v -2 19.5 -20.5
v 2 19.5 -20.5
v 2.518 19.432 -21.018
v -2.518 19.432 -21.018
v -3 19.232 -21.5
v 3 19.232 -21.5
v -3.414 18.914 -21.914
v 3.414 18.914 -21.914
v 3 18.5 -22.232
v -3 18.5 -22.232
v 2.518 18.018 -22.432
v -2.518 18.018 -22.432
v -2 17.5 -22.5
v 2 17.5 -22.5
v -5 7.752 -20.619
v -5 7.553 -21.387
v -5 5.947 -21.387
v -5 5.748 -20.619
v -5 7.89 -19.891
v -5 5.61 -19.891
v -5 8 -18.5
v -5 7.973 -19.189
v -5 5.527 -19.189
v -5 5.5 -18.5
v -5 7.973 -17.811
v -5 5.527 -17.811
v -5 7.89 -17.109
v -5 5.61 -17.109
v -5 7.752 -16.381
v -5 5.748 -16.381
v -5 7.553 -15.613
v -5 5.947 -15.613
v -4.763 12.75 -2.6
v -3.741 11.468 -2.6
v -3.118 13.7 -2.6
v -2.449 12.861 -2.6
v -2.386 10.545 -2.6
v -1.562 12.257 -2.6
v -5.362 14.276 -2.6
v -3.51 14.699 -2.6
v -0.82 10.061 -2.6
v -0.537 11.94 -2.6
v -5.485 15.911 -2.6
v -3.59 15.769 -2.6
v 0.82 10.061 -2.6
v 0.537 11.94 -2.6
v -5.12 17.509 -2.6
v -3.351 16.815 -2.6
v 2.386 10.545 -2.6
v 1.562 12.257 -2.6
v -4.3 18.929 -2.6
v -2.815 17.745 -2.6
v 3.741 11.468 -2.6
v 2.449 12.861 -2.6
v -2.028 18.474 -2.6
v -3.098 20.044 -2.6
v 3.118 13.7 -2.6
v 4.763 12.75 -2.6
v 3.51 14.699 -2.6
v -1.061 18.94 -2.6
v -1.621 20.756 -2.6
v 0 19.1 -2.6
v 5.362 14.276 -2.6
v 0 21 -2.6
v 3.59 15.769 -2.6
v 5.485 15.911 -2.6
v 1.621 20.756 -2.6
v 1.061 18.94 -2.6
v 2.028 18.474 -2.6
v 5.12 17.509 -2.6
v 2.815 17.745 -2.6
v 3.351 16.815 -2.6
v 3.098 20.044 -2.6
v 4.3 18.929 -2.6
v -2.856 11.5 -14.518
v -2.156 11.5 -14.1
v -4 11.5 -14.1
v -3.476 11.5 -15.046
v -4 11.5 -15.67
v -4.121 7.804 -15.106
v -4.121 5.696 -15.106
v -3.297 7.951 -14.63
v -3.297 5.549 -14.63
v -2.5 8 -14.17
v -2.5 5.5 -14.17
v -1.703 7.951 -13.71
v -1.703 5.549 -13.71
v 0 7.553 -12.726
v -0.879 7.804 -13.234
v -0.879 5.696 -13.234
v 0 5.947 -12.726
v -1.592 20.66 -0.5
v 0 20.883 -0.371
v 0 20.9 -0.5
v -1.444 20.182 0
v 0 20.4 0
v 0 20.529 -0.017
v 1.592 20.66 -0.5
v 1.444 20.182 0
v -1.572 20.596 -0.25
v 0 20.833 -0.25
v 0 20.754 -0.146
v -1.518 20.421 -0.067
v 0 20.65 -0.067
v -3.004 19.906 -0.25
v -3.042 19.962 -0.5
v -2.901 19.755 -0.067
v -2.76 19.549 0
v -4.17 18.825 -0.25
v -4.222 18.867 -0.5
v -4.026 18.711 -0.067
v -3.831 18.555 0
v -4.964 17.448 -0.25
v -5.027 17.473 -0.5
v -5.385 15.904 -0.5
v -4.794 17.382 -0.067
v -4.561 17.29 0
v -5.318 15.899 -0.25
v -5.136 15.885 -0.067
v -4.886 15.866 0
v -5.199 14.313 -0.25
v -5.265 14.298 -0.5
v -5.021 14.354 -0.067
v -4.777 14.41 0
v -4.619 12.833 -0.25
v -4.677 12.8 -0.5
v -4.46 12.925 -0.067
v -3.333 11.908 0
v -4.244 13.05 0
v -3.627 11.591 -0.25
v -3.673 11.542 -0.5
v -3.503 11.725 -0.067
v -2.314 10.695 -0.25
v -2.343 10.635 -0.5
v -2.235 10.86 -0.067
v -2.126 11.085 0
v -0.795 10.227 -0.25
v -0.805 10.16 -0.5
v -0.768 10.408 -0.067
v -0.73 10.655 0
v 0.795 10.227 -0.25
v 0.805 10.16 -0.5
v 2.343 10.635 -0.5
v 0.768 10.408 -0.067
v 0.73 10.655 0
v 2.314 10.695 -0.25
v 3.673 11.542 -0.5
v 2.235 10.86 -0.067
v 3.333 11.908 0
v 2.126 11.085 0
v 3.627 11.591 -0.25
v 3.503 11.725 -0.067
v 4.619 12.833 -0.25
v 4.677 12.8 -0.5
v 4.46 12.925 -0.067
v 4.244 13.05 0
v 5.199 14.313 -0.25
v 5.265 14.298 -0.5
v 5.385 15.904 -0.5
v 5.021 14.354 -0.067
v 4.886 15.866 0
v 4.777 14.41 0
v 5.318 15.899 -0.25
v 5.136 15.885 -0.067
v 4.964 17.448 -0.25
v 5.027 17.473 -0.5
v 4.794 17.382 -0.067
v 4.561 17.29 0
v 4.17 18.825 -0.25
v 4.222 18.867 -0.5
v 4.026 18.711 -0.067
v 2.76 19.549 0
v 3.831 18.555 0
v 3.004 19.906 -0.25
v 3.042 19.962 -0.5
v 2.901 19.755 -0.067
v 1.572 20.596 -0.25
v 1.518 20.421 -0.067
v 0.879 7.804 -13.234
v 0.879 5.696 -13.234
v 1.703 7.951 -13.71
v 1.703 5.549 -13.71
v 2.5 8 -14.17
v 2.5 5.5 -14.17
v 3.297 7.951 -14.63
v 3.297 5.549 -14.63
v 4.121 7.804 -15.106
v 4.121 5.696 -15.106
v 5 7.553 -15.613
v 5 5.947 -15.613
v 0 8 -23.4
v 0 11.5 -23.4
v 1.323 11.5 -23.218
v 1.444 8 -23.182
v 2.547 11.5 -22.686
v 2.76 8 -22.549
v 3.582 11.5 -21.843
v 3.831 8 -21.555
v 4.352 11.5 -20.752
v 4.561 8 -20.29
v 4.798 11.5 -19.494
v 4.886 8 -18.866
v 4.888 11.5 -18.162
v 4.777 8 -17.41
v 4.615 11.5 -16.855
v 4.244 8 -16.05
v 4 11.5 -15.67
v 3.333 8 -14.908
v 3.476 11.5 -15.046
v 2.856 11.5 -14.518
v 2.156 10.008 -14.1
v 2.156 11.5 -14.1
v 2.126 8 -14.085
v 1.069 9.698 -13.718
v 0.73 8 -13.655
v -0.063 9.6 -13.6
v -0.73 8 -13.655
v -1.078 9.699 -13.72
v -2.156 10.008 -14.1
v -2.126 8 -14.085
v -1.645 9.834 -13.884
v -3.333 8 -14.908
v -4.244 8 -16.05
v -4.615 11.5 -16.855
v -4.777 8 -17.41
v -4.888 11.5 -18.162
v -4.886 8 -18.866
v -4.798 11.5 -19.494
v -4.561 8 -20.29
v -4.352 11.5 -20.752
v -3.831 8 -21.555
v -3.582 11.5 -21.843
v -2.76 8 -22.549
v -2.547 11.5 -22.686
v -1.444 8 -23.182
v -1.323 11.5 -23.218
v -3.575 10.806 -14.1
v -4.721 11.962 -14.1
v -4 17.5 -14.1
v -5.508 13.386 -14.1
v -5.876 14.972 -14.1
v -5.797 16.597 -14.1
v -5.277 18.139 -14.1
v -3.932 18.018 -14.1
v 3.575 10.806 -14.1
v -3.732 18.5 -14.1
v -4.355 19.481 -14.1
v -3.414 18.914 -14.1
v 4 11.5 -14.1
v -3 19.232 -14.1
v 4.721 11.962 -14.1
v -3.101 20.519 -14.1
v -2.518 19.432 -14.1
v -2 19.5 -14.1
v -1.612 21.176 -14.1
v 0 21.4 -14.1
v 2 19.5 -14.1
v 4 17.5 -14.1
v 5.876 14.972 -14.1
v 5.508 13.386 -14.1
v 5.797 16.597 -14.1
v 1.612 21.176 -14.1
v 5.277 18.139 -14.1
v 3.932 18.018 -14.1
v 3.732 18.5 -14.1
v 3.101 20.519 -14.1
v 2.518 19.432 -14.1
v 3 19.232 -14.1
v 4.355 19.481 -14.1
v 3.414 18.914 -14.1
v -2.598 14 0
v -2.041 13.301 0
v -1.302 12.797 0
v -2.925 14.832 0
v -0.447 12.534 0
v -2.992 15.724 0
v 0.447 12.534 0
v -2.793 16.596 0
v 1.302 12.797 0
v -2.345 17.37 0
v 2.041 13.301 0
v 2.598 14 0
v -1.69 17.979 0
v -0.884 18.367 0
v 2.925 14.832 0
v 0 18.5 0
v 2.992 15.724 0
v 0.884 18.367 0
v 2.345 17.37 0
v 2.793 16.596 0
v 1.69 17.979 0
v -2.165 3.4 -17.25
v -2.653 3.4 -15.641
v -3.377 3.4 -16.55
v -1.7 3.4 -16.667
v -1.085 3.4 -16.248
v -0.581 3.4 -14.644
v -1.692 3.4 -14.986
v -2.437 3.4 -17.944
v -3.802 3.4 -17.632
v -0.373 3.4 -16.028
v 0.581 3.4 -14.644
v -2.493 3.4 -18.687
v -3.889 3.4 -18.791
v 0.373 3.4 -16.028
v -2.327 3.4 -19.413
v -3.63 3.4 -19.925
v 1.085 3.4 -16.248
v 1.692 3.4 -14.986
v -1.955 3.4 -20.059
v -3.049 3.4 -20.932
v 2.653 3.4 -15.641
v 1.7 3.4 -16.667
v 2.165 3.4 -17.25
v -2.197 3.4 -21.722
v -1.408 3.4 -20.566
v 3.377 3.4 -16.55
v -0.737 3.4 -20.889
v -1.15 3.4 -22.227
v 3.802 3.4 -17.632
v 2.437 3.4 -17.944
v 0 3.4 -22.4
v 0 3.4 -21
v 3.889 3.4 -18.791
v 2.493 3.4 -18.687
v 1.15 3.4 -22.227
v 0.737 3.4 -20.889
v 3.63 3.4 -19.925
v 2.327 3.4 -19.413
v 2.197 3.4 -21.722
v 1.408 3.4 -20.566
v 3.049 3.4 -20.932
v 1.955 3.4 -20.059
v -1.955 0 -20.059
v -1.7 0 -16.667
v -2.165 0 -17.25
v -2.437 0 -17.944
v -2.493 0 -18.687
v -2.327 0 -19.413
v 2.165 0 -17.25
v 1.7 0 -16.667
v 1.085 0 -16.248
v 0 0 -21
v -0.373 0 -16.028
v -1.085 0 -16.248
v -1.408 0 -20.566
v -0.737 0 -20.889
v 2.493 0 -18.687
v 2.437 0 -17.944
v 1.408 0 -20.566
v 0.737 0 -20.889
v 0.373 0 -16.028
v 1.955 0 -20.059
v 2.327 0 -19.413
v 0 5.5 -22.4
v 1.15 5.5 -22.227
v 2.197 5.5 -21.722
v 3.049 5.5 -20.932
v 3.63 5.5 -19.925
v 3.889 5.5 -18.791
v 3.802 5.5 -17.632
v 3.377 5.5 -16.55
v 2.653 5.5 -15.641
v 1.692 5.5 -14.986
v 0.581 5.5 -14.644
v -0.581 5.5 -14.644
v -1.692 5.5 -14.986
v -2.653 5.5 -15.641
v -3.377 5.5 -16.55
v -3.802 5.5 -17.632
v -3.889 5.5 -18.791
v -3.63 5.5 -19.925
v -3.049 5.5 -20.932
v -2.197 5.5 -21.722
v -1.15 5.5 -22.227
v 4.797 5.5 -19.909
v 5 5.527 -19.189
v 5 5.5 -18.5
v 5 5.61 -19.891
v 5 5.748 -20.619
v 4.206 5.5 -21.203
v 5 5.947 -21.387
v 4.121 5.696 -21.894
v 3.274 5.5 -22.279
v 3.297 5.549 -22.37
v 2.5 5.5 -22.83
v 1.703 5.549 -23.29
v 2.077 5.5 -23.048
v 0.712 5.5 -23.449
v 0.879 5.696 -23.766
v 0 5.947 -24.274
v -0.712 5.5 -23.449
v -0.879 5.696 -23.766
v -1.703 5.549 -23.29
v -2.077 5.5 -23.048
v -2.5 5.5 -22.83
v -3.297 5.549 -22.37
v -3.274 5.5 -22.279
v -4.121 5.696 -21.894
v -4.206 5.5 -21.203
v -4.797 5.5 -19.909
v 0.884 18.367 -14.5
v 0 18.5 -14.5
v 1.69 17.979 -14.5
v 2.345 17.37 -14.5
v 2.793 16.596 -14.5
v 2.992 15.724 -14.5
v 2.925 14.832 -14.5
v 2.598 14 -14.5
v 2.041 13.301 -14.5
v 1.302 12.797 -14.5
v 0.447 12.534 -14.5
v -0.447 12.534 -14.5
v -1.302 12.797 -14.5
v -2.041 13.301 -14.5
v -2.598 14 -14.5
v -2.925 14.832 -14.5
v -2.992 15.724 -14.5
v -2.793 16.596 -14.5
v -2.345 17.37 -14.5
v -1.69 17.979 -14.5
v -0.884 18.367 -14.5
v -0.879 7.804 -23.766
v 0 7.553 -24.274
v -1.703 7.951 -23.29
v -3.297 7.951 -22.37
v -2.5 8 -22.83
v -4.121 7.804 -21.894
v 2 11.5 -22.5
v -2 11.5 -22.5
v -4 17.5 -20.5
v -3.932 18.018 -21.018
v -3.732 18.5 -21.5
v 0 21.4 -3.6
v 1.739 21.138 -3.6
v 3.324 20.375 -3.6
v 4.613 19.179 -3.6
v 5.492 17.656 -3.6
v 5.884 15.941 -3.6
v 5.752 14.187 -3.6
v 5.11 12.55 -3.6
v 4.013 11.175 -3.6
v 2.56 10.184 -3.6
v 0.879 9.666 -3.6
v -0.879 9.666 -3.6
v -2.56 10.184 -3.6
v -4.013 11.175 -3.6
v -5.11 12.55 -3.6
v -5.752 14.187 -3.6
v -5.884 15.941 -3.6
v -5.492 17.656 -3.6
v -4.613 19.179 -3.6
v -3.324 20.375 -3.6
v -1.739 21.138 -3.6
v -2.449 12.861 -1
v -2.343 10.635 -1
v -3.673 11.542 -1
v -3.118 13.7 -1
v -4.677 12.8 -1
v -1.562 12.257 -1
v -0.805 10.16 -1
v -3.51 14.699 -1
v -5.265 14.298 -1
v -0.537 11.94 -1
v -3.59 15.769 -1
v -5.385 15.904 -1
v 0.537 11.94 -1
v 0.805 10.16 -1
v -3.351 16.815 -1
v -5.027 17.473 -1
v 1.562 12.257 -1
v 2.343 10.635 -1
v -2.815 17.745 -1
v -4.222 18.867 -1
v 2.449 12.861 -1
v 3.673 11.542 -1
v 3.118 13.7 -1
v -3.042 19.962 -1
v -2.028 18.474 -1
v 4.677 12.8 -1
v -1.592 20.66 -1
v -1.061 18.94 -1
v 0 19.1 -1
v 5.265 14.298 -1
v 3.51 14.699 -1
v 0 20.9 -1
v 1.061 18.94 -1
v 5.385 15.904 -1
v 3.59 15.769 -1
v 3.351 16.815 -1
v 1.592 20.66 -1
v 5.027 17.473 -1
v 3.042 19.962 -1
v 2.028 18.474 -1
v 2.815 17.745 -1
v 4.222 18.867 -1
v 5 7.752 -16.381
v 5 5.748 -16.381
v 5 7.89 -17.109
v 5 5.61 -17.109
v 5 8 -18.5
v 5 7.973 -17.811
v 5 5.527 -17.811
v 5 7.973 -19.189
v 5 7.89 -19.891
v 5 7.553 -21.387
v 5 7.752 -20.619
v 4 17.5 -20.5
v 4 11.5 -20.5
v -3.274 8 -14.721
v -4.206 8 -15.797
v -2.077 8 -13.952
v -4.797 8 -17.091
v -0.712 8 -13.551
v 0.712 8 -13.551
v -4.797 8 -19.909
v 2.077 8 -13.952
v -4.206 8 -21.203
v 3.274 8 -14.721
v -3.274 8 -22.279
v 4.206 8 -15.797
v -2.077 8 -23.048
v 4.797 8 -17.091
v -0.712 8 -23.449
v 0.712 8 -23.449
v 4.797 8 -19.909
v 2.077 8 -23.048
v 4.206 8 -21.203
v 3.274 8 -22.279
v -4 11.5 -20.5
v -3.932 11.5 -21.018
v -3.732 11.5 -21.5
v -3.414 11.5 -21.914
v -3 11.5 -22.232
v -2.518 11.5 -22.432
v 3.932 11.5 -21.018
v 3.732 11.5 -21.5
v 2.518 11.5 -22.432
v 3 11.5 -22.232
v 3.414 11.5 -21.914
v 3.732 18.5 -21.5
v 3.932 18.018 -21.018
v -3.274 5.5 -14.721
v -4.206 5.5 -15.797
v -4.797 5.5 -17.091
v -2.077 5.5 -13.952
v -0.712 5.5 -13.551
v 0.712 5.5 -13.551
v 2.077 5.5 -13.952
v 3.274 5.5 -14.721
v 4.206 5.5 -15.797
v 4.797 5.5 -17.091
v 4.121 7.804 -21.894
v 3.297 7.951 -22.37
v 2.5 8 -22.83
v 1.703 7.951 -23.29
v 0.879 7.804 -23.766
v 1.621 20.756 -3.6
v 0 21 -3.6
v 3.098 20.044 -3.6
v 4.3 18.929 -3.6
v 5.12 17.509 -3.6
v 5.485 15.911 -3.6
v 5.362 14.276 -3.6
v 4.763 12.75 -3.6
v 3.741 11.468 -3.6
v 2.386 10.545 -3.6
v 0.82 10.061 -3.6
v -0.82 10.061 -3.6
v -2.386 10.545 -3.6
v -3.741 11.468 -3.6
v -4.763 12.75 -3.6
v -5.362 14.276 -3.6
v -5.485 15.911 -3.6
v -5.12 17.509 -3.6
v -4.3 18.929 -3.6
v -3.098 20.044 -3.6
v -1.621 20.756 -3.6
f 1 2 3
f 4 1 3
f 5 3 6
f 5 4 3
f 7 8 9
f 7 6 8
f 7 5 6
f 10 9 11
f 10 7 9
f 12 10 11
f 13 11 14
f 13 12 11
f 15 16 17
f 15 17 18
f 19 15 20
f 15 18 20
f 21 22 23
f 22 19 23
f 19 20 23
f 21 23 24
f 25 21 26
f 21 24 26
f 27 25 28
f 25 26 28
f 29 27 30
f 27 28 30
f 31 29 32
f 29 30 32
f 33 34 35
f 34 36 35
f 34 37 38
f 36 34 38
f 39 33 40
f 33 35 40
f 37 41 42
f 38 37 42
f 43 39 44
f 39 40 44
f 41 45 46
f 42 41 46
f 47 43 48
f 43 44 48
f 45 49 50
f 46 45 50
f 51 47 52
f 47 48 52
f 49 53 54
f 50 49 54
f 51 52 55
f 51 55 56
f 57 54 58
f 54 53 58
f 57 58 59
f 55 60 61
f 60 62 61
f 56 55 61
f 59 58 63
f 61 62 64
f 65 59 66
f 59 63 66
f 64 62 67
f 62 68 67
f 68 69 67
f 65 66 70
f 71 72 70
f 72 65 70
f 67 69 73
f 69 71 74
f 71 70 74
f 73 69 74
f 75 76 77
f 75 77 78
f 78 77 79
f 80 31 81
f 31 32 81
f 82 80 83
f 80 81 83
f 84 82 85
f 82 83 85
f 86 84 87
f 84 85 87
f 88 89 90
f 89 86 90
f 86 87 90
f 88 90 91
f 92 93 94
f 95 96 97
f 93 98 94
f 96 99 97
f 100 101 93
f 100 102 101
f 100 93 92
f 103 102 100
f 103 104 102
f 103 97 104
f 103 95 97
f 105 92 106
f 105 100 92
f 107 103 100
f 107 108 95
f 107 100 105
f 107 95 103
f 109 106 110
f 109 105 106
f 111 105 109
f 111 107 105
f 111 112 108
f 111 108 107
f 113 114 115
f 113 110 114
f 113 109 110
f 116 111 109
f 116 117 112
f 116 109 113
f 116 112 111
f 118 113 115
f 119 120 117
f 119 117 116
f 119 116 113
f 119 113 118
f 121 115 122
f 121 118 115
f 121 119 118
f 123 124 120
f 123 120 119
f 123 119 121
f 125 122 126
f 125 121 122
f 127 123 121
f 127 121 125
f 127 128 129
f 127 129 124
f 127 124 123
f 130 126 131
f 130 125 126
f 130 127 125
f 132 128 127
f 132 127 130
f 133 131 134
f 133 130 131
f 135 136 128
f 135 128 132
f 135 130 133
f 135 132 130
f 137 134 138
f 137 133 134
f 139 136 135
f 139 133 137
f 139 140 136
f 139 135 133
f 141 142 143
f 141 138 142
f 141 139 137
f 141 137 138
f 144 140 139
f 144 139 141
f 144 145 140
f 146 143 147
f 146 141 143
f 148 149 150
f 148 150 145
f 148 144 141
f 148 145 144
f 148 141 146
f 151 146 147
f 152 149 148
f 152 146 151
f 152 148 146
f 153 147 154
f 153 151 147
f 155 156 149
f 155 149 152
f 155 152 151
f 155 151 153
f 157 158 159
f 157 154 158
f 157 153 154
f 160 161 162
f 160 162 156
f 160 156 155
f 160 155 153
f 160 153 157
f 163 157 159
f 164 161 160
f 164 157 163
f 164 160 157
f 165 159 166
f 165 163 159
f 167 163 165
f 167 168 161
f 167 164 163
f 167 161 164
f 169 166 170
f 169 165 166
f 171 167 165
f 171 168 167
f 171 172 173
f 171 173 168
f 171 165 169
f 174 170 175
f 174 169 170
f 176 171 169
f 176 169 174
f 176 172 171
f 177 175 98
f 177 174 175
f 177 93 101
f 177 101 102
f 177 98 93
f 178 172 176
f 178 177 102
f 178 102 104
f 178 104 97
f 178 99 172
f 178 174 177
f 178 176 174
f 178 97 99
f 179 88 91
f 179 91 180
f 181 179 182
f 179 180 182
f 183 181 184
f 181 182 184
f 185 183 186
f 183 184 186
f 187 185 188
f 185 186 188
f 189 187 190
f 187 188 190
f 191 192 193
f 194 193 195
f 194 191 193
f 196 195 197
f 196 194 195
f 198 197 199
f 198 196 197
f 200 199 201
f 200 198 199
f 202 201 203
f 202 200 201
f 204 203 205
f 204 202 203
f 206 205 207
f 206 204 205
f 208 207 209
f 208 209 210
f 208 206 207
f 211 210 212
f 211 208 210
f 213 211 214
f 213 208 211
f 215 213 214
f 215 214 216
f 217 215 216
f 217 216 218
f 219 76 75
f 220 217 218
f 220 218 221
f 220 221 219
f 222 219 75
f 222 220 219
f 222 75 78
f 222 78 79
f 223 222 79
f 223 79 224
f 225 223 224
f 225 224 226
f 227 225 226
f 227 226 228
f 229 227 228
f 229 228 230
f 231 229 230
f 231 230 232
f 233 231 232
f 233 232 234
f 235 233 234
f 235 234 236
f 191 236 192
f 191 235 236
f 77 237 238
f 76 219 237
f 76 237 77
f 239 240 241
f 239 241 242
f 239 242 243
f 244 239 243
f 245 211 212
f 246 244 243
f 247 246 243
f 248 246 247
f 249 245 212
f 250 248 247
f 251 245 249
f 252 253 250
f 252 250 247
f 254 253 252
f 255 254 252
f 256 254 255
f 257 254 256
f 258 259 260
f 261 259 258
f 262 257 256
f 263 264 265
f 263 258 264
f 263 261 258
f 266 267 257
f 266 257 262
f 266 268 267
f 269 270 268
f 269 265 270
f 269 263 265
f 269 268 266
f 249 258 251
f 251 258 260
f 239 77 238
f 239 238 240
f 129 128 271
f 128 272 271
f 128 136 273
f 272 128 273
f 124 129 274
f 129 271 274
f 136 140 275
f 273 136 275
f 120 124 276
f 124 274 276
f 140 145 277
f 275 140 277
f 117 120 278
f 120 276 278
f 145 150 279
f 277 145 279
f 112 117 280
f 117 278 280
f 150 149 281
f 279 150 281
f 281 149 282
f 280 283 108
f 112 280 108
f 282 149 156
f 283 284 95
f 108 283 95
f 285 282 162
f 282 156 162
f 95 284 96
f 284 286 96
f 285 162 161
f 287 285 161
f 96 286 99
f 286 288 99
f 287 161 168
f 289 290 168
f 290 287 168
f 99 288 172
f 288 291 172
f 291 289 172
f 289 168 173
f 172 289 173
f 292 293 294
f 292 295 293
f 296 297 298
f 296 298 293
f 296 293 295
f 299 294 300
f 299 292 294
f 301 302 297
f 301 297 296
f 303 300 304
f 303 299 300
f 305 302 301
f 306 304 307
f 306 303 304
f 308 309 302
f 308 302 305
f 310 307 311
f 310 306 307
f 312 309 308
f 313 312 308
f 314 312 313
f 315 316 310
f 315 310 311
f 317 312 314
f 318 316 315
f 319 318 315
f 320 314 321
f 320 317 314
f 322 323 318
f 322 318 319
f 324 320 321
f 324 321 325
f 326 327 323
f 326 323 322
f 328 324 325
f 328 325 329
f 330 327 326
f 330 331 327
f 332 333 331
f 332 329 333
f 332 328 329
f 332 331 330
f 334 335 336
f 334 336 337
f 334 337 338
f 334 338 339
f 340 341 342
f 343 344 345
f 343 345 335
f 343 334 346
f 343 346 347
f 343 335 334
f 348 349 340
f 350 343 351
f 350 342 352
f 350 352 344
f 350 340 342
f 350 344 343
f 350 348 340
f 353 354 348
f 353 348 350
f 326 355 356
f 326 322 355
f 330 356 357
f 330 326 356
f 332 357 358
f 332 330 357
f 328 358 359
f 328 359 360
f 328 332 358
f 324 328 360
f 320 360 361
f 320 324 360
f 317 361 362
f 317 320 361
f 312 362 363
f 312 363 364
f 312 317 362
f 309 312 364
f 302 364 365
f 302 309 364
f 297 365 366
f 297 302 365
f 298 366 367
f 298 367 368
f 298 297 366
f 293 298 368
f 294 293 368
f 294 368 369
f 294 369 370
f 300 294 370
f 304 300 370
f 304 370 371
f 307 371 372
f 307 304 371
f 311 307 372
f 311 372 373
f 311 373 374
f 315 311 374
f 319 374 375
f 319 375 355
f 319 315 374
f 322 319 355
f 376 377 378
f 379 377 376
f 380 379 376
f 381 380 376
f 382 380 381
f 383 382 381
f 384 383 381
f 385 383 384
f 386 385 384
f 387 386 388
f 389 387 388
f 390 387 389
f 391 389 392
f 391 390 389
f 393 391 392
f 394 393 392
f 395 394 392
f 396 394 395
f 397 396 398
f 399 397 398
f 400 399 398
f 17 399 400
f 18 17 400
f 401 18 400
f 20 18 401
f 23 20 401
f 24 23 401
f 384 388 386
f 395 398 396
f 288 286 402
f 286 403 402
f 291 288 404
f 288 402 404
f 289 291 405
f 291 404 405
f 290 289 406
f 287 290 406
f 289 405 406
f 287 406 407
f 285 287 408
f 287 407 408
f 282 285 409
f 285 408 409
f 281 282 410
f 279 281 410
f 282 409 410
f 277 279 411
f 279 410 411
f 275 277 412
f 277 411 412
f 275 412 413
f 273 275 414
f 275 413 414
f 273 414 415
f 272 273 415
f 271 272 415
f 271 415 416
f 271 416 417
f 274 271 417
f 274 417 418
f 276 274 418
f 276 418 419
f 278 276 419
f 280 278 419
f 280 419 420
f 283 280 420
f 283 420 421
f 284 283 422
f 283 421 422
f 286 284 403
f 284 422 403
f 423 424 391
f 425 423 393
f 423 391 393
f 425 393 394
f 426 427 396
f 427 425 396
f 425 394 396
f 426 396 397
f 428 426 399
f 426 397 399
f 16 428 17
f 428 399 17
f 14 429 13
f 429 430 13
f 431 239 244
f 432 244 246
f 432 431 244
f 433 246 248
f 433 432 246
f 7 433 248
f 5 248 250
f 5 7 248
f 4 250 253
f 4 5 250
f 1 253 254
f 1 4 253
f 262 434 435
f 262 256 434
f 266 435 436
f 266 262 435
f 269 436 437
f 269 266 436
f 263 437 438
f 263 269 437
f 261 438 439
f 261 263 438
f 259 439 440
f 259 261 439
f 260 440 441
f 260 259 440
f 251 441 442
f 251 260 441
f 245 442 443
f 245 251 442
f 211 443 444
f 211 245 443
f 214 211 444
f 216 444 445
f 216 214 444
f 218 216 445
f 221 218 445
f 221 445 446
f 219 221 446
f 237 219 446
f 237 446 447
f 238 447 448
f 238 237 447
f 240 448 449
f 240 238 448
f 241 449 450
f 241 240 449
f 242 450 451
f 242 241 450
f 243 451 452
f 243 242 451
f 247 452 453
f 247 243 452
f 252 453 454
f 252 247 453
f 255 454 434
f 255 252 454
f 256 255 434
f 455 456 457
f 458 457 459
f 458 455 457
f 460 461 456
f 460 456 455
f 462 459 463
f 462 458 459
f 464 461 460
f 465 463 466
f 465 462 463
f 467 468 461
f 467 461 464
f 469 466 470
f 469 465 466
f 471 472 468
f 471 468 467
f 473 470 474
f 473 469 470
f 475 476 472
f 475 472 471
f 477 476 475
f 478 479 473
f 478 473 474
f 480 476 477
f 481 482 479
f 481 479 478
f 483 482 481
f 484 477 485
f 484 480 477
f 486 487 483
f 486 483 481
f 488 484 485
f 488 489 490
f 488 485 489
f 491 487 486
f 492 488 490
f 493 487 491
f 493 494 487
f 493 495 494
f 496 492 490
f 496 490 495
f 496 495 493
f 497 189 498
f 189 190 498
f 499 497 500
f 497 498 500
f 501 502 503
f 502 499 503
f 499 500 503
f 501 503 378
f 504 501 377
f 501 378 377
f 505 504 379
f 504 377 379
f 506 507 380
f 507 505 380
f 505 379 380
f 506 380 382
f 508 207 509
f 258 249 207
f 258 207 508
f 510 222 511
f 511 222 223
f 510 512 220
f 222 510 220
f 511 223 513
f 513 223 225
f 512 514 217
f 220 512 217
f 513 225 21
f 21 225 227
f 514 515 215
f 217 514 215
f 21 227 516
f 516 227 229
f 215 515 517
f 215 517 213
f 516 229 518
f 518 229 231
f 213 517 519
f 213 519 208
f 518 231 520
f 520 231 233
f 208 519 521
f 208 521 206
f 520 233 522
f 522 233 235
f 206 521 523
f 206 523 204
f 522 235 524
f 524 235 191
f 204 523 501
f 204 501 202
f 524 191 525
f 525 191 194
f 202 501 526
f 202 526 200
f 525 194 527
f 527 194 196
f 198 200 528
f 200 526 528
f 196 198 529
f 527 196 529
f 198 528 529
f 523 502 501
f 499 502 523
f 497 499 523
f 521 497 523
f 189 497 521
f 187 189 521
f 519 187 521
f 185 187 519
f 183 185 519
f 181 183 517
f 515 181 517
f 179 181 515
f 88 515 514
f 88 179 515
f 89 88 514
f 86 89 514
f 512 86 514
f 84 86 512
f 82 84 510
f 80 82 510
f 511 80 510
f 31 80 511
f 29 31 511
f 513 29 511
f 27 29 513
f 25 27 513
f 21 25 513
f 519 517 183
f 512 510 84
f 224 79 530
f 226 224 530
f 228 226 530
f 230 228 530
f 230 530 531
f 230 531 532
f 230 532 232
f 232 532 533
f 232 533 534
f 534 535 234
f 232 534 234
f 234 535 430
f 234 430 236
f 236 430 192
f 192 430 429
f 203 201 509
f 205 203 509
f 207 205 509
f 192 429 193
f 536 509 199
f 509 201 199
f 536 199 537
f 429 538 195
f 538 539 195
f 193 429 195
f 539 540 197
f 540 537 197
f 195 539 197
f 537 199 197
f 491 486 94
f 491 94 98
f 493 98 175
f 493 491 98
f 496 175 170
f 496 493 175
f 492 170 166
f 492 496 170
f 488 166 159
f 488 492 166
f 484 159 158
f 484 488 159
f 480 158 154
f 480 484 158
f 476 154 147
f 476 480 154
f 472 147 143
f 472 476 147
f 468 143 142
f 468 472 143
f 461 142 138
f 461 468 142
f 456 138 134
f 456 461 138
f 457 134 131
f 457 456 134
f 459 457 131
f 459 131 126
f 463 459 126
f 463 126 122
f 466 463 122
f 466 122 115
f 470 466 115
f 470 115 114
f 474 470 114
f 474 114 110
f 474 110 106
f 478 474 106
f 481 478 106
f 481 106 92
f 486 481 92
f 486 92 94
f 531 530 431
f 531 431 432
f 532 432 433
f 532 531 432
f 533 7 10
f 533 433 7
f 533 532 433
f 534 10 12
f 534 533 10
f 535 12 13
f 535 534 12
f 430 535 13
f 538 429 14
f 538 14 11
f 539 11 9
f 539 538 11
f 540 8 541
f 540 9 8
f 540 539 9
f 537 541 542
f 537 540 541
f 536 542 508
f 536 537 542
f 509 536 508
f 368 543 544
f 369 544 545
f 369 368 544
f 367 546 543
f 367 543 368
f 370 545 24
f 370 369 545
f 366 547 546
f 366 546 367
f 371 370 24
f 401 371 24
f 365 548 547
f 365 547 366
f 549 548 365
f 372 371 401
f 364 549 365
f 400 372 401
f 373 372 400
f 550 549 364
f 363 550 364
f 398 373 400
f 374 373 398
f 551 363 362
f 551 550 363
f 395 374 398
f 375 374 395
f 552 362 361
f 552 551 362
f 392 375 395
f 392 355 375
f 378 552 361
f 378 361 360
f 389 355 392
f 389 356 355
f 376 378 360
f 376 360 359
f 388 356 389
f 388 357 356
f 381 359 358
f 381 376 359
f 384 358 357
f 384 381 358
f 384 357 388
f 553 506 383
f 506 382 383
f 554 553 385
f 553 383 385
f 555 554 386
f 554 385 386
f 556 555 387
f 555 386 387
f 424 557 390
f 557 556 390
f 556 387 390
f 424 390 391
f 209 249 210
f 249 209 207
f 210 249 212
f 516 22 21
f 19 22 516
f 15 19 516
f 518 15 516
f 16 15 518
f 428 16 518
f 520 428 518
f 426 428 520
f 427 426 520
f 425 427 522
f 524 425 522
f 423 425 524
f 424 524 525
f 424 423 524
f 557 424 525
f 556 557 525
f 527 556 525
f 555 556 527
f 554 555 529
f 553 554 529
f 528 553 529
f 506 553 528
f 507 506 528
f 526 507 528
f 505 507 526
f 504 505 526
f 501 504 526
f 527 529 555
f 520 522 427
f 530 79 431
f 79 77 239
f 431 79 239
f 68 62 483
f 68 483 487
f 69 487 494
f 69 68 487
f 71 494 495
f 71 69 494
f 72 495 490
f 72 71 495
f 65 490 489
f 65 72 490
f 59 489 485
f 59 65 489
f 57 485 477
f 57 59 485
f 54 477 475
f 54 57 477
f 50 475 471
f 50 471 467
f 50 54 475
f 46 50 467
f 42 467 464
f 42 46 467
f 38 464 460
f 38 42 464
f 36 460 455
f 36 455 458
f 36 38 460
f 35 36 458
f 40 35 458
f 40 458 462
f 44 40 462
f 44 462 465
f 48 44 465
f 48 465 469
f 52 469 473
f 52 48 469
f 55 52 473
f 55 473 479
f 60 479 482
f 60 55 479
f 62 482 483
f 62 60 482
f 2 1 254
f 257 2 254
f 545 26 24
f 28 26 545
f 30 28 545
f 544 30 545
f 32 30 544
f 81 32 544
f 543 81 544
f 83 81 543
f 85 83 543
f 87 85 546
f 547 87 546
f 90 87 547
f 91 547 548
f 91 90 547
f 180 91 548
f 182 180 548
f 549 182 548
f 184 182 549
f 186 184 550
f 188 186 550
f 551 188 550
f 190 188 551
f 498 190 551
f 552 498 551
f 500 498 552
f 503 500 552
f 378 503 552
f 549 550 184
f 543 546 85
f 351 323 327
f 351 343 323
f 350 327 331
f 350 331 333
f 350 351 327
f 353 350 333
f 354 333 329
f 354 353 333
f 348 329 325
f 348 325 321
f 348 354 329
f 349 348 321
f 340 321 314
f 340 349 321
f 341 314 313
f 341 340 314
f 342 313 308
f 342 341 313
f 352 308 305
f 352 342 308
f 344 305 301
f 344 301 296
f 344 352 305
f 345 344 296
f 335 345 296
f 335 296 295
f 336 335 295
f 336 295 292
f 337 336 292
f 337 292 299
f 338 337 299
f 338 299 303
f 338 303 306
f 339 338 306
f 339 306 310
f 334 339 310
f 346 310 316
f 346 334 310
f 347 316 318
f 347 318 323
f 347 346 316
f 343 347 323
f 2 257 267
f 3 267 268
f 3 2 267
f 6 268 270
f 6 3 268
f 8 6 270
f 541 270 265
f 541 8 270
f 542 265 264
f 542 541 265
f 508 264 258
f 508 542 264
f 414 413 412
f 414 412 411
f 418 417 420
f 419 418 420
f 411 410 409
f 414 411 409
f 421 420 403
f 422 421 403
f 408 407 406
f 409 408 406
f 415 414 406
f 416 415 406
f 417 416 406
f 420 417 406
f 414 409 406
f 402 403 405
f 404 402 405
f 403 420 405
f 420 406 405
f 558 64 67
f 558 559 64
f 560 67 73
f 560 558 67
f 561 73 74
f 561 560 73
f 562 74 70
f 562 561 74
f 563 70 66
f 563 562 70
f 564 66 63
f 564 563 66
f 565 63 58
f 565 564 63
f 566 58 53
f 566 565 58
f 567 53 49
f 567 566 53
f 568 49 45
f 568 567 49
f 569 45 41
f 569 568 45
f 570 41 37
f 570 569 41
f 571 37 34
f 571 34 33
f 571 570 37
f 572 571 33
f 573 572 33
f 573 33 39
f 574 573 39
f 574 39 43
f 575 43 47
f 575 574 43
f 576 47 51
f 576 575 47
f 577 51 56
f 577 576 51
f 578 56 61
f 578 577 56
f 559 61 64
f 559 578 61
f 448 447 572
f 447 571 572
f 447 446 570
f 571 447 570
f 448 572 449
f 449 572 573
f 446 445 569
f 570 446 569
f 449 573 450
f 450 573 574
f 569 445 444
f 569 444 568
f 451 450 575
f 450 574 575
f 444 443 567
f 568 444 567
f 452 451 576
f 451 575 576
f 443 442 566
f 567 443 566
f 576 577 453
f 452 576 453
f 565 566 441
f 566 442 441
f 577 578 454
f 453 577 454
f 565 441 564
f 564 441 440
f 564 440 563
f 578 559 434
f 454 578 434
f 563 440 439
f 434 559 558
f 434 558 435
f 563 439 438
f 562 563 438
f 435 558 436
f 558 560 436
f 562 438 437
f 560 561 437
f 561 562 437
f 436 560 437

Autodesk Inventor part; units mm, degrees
ref_plane "YZ Plane" through (0, 0, 0) normal (1, 0, 0) x (0, 1, 0)
ref_plane "XZ Plane" through (0, 0, 0) normal (0, 1, 0) x (-1, 0, 0)
ref_plane "XY Plane" through (0, 0, 0) normal (0, 0, 1) x (1, 0, 0)
sketch "Sketch_20" plane through (0, 0, 0) normal (1, 0, 0) x (0, 1, 0)
  line L0 (19.5, -14.1) -> (11.5, -14.1)
  line L1 (11.5, -14.1) -> (11.5, -22.5)
  line L2 (11.5, -22.5) -> (17.5, -22.5)
  arc A0 (17.5, -22.5) -> (19.5, -20.5) centre (17.5, -20.5) ccw
  line L3 (19.5, -20.5) -> (19.5, -14.1)
extrude "Extrusion1" add sketch "Sketch_20" along normal mid plane 8
sketch "Sketch_2" plane through (0, 0, 0) normal (0, 0, 1) x (1, 0, 0)
  line L0 (-10, 5) -> (10, 5)
  line L1 (10, 5) -> (10, 25)
  line L2 (10, 25) -> (-10, 25)
  line L3 (-10, 25) -> (-10, 5)
  line L4 (-4, 11.5) -> (4, 11.5)
  line L5 (4, 11.5) -> (4, 17.5)
  arc A0 (4, 17.5) -> (2, 19.5) centre (2, 17.5) ccw
  line L6 (2, 19.5) -> (-2, 19.5)
  arc A1 (-2, 19.5) -> (-4, 17.5) centre (-2, 17.5) ccw
  line L7 (-4, 17.5) -> (-4, 11.5)
extrude "Extrusion2" cut sketch "Sketch_2" along normal mid plane 57
sketch "Sketch_13" plane through (0, 0, 0) normal (0, 1, 0) x (-1, 0, 0)
  line L0 (10, -10) -> (-10, -10)
  line L1 (-10, -10) -> (-10, -25)
  line L2 (-10, -25) -> (10, -25)
  line L3 (10, -25) -> (10, -10)
  line L4 (4, -20.5) -> (4, -12.5)
  line L5 (4, -12.5) -> (-4, -12.5)
  line L6 (-4, -12.5) -> (-4, -20.5)
  arc A0 (-4, -20.5) -> (-2, -22.5) centre (-2, -20.5) ccw
  line L7 (-2, -22.5) -> (2, -22.5)
  arc A1 (2, -22.5) -> (4, -20.5) centre (2, -20.5) ccw
extrude "Extrusion3" cut sketch "Sketch_13" along normal blind 25
sketch "Sketch_12" plane through (0, 0, 0) normal (1, 0, 0) x (0, 1, 0)
  line L0 (3.4, -18.5) -> (11.5, -18.5)
  line L1 (11.5, -18.5) -> (11.5, -23.4)
  line L2 (11.5, -23.4) -> (8, -23.4)
  line L3 (8, -23.4) -> (8, -23.5)
  line L4 (8, -23.5) -> (7.4226, -24.5)
  line L5 (7.4226, -24.5) -> (6.0774, -24.5)
  line L6 (6.0774, -24.5) -> (5.5, -23.5)
  line L7 (5.5, -23.5) -> (5.5, -22.4)
  line L8 (5.5, -22.4) -> (3.4, -22.4)
  line L9 (3.4, -22.4) -> (3.4, -18.5)
  line L10 (3.4, -18.5) -> (11.5, -18.5)
revolve "Revolution1" add sketch "Sketch_12" angle 360 about axis through (0, 3.4, -18.5) along (0, -1, 0)
sketch "Sketch_6" plane through (0, 0, 0) normal (0, 1, 0) x (-1, 0, 0)
  line L0 (10, -8.5) -> (-10, -8.5)
  line L1 (-10, -8.5) -> (-10, -28.5)
  line L2 (-10, -28.5) -> (10, -28.5)
  line L3 (10, -28.5) -> (10, -8.5)
  line L4 (5, -15.6132) -> (0, -12.7265)
  line L5 (0, -12.7265) -> (-5, -15.6132)
  line L6 (-5, -15.6132) -> (-5, -21.3868)
  line L7 (-5, -21.3868) -> (0, -24.2735)
  line L8 (0, -24.2735) -> (5, -21.3868)
  line L9 (5, -21.3868) -> (5, -15.6132)
extrude "Extrusion4" cut sketch "Sketch_6" along normal blind 10
sketch "Sketch_7" plane through (0, 0, 0) normal (1, 0, 0) x (0, 1, 0)
  line L0 (0, -18.5) -> (3.4, -18.5)
  line L1 (3.4, -18.5) -> (3.4, -21)
  line L2 (3.4, -21) -> (0, -21)
  line L3 (0, -21) -> (0, -18.5)
  line L4 (0, -18.5) -> (3.4, -18.5)
revolve "Revolution2" add sketch "Sketch_7" angle 360 about axis through (0, 0, -18.5) along (0, -1, 0)
thread "Thread1" size "M5x0.8" class "6g" standard "ISO Metric profile" full length
sketch "Sketch_15" plane through (0, 0, 0) normal (1, 0, 0) x (0, 1, 0)
  line L0 (15.5, -14.1) -> (15.5, 0)
  line L1 (15.5, 0) -> (20.4, 0)
  arc A0 (20.9, -0.5) -> (20.4, 0) centre (20.4, -0.5) ccw
  line L2 (20.9, -0.5) -> (20.9, -1)
  line L3 (20.9, -1) -> (19.1, -1)
  line L4 (19.1, -1) -> (19.1, -2.6)
  line L5 (19.1, -2.6) -> (21, -2.6)
  line L6 (21, -2.6) -> (21, -3.6)
  line L7 (21, -3.6) -> (21.4, -3.6)
  line L8 (21.4, -3.6) -> (21.4, -14.1)
  line L9 (21.4, -14.1) -> (15.5, -14.1)
  line L10 (15.5, -14.1) -> (15.5, 0)
revolve "Revolution3" add sketch "Sketch_15" angle 360 about axis through (0, 15.5, -14.1) along (0, 0, -1)
sketch "Sketch_18" plane through (0, 0, 0) normal (1, 0, 0) x (0, 1, 0)
  line L0 (15.5, -14.5) -> (15.5, 0)
  line L1 (15.5, 0) -> (18.5, 0)
  line L2 (18.5, 0) -> (18.5, -14.5)
  line L3 (18.5, -14.5) -> (15.5, -14.5)
  line L4 (15.5, -14.5) -> (15.5, 0)
revolve "Revolution4" cut sketch "Sketch_18" angle 360 about axis through (0, 15.5, -14.5) along (0, 0, -1)
properties part number "GWJL6-M5"
